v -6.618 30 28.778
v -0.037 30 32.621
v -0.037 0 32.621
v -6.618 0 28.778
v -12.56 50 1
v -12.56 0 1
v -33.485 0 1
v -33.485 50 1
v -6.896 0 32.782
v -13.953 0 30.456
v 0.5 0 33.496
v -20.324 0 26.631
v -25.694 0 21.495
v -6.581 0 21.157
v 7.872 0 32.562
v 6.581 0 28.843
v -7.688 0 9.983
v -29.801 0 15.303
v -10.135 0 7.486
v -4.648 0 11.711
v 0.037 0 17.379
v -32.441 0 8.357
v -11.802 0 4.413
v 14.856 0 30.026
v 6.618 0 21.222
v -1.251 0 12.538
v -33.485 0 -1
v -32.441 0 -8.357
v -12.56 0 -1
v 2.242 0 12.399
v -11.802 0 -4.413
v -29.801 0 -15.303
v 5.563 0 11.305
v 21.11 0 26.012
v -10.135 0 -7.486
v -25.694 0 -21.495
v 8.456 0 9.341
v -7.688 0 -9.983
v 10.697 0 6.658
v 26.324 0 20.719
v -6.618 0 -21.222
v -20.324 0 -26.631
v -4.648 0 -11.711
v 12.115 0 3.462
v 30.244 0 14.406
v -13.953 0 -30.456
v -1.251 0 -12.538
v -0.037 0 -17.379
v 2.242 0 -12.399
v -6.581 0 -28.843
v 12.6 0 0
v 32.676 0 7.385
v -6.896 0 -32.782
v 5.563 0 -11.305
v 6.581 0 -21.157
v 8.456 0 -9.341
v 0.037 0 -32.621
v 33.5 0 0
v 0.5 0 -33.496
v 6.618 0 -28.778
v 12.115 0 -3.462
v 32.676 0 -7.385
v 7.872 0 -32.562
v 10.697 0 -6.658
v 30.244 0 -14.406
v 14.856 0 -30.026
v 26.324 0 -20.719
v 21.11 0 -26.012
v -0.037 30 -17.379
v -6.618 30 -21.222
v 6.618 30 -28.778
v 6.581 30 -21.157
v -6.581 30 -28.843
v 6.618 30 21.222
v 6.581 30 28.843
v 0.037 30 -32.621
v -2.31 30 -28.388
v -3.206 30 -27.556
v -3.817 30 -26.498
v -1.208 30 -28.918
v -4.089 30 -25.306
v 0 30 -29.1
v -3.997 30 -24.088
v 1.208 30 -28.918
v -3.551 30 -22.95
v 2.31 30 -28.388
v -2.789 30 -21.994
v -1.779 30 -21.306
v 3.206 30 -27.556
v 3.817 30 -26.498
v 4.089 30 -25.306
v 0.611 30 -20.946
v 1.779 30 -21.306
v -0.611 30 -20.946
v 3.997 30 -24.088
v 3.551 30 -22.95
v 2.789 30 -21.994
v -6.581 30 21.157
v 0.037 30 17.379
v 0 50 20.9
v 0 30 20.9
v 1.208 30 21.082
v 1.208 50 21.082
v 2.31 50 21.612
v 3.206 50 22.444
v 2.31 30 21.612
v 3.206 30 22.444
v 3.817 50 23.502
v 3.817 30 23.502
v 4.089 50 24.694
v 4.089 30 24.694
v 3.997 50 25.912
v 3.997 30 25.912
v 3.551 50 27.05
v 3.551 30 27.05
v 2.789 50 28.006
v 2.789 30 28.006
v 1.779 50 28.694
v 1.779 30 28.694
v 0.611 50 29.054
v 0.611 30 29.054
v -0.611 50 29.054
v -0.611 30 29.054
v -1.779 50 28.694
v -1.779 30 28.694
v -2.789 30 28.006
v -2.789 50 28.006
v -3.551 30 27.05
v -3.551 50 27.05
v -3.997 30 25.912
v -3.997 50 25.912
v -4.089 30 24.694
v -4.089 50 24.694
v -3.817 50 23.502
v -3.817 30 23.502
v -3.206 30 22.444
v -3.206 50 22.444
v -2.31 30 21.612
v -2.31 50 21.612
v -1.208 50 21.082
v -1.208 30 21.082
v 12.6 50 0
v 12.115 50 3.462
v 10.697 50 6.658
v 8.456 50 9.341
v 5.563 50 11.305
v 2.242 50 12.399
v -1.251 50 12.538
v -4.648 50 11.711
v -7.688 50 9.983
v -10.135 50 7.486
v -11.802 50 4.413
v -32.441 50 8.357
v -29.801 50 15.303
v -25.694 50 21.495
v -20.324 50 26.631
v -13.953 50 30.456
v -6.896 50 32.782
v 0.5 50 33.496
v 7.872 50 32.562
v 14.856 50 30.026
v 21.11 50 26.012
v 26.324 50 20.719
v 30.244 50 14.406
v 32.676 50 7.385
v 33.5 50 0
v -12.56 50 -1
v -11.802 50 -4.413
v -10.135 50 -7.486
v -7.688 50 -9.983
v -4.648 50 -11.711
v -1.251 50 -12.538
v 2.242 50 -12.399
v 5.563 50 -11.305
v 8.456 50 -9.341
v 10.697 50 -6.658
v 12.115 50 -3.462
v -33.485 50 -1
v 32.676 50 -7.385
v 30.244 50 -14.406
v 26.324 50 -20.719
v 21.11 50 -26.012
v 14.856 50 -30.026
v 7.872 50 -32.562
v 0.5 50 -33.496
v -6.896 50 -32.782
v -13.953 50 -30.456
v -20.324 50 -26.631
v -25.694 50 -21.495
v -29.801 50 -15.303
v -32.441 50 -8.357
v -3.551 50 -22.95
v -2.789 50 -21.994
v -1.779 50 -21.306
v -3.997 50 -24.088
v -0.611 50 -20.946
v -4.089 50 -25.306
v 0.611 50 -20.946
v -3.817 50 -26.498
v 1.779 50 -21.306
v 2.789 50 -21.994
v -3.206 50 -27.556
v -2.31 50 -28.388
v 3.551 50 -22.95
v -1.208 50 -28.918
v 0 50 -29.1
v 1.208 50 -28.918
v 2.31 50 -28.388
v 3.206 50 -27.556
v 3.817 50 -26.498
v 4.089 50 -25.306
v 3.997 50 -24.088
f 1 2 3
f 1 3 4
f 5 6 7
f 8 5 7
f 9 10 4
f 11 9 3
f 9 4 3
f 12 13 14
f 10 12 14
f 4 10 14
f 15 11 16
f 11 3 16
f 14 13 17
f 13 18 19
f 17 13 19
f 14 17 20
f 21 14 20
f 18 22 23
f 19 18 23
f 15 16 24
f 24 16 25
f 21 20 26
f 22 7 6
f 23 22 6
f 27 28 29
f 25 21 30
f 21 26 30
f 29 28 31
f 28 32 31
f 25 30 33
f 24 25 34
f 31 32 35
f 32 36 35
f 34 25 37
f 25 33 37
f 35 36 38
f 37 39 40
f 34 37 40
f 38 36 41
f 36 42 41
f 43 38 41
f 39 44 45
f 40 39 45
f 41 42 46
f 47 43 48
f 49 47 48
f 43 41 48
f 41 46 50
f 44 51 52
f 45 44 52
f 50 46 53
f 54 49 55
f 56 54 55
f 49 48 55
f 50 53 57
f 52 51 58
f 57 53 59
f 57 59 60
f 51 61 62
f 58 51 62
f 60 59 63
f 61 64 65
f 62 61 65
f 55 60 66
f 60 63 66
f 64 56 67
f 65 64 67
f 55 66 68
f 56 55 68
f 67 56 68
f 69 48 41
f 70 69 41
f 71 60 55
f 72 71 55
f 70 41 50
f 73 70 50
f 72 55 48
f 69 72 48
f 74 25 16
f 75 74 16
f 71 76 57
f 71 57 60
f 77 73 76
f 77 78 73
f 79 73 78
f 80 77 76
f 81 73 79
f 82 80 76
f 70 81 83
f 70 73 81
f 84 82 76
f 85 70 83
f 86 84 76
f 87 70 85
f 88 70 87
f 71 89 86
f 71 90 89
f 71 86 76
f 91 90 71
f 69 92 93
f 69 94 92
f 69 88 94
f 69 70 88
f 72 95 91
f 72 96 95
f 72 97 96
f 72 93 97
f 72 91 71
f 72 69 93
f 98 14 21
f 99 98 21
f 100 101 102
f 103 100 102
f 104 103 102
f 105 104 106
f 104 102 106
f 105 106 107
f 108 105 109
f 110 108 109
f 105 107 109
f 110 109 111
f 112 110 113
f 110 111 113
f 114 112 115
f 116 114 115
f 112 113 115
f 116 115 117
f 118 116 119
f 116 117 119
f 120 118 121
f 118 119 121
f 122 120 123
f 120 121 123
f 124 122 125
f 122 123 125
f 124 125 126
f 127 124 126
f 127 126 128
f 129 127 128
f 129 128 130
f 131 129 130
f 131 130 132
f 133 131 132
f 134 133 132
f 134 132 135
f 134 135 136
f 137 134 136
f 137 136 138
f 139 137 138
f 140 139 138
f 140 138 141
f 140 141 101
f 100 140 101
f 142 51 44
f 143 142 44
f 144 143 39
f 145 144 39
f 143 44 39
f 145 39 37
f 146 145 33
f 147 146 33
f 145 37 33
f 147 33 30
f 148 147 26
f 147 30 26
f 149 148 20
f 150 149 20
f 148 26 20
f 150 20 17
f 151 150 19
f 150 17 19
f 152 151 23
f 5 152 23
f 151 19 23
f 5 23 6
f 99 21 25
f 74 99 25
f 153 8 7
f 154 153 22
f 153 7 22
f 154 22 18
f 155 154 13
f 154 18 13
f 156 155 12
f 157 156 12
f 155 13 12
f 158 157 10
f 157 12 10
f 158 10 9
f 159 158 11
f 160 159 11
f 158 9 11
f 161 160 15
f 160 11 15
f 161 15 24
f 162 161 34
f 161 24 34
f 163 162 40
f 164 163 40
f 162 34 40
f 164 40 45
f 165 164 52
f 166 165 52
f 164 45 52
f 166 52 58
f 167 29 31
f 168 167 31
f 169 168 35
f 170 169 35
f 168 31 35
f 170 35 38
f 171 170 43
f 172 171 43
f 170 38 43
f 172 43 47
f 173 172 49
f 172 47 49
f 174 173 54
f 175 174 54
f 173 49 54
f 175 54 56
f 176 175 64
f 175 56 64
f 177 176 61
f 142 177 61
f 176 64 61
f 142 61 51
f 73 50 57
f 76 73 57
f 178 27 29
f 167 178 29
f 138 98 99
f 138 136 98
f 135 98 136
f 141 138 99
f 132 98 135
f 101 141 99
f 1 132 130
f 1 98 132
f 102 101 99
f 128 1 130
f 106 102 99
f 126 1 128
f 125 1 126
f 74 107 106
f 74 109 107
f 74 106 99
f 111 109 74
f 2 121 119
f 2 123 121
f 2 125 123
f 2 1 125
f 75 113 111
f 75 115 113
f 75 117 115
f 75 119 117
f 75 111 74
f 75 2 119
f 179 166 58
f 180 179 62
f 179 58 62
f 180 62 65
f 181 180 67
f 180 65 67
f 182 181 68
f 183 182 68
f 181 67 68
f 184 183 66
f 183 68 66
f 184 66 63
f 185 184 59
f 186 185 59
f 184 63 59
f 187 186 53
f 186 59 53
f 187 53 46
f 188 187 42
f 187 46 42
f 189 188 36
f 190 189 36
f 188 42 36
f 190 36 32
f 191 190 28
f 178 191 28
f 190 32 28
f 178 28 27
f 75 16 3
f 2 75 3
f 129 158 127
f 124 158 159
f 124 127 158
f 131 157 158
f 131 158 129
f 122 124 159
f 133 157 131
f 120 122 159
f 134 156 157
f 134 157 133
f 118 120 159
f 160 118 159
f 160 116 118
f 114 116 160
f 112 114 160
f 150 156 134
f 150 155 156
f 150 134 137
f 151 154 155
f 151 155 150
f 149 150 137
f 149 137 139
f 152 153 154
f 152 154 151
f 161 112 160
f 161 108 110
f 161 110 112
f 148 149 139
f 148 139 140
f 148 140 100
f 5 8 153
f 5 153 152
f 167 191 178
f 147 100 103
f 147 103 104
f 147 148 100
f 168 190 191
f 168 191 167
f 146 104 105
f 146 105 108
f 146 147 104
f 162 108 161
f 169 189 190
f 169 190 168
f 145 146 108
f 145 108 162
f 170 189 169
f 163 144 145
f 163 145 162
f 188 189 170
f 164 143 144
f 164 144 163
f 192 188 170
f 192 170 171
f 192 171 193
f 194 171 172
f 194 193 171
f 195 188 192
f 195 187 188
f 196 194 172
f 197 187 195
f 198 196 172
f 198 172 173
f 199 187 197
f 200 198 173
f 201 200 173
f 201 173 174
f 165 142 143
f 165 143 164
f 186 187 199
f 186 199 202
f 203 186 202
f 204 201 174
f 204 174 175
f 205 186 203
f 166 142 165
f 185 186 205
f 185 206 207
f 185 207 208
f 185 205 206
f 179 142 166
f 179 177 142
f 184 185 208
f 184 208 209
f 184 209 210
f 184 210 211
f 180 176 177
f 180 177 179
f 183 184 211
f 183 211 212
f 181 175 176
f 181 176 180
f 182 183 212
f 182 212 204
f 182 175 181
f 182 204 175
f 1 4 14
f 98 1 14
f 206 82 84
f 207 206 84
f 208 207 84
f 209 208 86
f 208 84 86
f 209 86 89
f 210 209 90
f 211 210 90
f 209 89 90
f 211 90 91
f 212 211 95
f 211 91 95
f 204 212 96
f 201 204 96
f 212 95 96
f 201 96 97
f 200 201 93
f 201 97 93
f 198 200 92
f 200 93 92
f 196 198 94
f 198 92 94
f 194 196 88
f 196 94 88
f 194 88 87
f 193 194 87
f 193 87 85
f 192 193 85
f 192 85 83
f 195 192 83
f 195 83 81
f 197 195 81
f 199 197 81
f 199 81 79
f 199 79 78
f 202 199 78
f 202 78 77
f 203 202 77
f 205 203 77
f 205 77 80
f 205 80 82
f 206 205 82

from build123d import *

# Parameters (mm, degrees)
BOSS_EXTRUDE2_DEPTH = 50
CUT_EXTRUDE1_REACH  = 70.88
SKETCH3_R           = 4.1
CUT_EXTRUDE2_DEPTH  = 30


with BuildPart() as part:
    # Sketch2 → Boss-Extrude2 (new body)
    with BuildSketch(Plane(origin=(0, 0, 0), x_dir=(1, 0, 0), z_dir=(0, 1, 0))):
        with BuildLine():
            ThreePointArc((12.6, 0), (0.500394765, -12.590059773), (-12.560254774, -1))
            Line((-12.560254774, -1), (-33.485071301, -1))
            ThreePointArc((-33.485071301, -1), (0.500055713, -33.496267617), (33.5, 0))
            ThreePointArc((33.5, 0), (0.500055713, 33.496267617), (-33.485071301, 1))
            Line((-33.485071301, 1), (-12.560254774, 1))
            ThreePointArc((-12.560254774, 1), (0.500394765, 12.590059773), (12.6, 0))
        make_face()
    extrude(amount=BOSS_EXTRUDE2_DEPTH)

    # Sketch3 → Cut-Extrude1 (cut, up to next)
    with BuildSketch(Plane.XZ, mode=Mode.PRIVATE) as cut_extrude1_sk1:
        with Locations(Location((0, 25, 0), (0, 0, 270))):
            Circle(SKETCH3_R)
    cut_extrude1_tool1 = extrude(cut_extrude1_sk1.sketch, amount=-CUT_EXTRUDE1_REACH, mode=Mode.PRIVATE) & part.part
    # Sketch3 → Cut-Extrude1 (cut, up to next)
    with BuildSketch(Plane.XZ, mode=Mode.PRIVATE) as cut_extrude1_sk2:
        with Locations(Location((0, -25, 0), (0, 0, 270))):
            Circle(SKETCH3_R)
    cut_extrude1_tool2 = extrude(cut_extrude1_sk2.sketch, amount=-CUT_EXTRUDE1_REACH, mode=Mode.PRIVATE) & part.part
    add(cut_extrude1_tool1.solids().sort_by_distance((0, 0, 25))[0], mode=Mode.SUBTRACT)
    add(cut_extrude1_tool2.solids().sort_by_distance((0, 0, -25))[0], mode=Mode.SUBTRACT)

    # Sketch8 → Cut-Extrude2 (cut)
    with BuildSketch(Plane.XZ):
        Polygon((6.618426782, 21.22158407), (6.581417572, 28.842517761), (-0.03700921, 32.620933691), (-6.618426782, 28.77841593), (-6.581417572, 21.157482239), (0.03700921, 17.379066309), align=None)
        Polygon((6.618426782, -28.77841593), (6.581417572, -21.157482239), (-0.03700921, -17.379066309), (-6.618426782, -21.22158407), (-6.581417572, -28.842517761), (0.03700921, -32.620933691), align=None)
    extrude(amount=-CUT_EXTRUDE2_DEPTH, mode=Mode.SUBTRACT)


solid = part.part
